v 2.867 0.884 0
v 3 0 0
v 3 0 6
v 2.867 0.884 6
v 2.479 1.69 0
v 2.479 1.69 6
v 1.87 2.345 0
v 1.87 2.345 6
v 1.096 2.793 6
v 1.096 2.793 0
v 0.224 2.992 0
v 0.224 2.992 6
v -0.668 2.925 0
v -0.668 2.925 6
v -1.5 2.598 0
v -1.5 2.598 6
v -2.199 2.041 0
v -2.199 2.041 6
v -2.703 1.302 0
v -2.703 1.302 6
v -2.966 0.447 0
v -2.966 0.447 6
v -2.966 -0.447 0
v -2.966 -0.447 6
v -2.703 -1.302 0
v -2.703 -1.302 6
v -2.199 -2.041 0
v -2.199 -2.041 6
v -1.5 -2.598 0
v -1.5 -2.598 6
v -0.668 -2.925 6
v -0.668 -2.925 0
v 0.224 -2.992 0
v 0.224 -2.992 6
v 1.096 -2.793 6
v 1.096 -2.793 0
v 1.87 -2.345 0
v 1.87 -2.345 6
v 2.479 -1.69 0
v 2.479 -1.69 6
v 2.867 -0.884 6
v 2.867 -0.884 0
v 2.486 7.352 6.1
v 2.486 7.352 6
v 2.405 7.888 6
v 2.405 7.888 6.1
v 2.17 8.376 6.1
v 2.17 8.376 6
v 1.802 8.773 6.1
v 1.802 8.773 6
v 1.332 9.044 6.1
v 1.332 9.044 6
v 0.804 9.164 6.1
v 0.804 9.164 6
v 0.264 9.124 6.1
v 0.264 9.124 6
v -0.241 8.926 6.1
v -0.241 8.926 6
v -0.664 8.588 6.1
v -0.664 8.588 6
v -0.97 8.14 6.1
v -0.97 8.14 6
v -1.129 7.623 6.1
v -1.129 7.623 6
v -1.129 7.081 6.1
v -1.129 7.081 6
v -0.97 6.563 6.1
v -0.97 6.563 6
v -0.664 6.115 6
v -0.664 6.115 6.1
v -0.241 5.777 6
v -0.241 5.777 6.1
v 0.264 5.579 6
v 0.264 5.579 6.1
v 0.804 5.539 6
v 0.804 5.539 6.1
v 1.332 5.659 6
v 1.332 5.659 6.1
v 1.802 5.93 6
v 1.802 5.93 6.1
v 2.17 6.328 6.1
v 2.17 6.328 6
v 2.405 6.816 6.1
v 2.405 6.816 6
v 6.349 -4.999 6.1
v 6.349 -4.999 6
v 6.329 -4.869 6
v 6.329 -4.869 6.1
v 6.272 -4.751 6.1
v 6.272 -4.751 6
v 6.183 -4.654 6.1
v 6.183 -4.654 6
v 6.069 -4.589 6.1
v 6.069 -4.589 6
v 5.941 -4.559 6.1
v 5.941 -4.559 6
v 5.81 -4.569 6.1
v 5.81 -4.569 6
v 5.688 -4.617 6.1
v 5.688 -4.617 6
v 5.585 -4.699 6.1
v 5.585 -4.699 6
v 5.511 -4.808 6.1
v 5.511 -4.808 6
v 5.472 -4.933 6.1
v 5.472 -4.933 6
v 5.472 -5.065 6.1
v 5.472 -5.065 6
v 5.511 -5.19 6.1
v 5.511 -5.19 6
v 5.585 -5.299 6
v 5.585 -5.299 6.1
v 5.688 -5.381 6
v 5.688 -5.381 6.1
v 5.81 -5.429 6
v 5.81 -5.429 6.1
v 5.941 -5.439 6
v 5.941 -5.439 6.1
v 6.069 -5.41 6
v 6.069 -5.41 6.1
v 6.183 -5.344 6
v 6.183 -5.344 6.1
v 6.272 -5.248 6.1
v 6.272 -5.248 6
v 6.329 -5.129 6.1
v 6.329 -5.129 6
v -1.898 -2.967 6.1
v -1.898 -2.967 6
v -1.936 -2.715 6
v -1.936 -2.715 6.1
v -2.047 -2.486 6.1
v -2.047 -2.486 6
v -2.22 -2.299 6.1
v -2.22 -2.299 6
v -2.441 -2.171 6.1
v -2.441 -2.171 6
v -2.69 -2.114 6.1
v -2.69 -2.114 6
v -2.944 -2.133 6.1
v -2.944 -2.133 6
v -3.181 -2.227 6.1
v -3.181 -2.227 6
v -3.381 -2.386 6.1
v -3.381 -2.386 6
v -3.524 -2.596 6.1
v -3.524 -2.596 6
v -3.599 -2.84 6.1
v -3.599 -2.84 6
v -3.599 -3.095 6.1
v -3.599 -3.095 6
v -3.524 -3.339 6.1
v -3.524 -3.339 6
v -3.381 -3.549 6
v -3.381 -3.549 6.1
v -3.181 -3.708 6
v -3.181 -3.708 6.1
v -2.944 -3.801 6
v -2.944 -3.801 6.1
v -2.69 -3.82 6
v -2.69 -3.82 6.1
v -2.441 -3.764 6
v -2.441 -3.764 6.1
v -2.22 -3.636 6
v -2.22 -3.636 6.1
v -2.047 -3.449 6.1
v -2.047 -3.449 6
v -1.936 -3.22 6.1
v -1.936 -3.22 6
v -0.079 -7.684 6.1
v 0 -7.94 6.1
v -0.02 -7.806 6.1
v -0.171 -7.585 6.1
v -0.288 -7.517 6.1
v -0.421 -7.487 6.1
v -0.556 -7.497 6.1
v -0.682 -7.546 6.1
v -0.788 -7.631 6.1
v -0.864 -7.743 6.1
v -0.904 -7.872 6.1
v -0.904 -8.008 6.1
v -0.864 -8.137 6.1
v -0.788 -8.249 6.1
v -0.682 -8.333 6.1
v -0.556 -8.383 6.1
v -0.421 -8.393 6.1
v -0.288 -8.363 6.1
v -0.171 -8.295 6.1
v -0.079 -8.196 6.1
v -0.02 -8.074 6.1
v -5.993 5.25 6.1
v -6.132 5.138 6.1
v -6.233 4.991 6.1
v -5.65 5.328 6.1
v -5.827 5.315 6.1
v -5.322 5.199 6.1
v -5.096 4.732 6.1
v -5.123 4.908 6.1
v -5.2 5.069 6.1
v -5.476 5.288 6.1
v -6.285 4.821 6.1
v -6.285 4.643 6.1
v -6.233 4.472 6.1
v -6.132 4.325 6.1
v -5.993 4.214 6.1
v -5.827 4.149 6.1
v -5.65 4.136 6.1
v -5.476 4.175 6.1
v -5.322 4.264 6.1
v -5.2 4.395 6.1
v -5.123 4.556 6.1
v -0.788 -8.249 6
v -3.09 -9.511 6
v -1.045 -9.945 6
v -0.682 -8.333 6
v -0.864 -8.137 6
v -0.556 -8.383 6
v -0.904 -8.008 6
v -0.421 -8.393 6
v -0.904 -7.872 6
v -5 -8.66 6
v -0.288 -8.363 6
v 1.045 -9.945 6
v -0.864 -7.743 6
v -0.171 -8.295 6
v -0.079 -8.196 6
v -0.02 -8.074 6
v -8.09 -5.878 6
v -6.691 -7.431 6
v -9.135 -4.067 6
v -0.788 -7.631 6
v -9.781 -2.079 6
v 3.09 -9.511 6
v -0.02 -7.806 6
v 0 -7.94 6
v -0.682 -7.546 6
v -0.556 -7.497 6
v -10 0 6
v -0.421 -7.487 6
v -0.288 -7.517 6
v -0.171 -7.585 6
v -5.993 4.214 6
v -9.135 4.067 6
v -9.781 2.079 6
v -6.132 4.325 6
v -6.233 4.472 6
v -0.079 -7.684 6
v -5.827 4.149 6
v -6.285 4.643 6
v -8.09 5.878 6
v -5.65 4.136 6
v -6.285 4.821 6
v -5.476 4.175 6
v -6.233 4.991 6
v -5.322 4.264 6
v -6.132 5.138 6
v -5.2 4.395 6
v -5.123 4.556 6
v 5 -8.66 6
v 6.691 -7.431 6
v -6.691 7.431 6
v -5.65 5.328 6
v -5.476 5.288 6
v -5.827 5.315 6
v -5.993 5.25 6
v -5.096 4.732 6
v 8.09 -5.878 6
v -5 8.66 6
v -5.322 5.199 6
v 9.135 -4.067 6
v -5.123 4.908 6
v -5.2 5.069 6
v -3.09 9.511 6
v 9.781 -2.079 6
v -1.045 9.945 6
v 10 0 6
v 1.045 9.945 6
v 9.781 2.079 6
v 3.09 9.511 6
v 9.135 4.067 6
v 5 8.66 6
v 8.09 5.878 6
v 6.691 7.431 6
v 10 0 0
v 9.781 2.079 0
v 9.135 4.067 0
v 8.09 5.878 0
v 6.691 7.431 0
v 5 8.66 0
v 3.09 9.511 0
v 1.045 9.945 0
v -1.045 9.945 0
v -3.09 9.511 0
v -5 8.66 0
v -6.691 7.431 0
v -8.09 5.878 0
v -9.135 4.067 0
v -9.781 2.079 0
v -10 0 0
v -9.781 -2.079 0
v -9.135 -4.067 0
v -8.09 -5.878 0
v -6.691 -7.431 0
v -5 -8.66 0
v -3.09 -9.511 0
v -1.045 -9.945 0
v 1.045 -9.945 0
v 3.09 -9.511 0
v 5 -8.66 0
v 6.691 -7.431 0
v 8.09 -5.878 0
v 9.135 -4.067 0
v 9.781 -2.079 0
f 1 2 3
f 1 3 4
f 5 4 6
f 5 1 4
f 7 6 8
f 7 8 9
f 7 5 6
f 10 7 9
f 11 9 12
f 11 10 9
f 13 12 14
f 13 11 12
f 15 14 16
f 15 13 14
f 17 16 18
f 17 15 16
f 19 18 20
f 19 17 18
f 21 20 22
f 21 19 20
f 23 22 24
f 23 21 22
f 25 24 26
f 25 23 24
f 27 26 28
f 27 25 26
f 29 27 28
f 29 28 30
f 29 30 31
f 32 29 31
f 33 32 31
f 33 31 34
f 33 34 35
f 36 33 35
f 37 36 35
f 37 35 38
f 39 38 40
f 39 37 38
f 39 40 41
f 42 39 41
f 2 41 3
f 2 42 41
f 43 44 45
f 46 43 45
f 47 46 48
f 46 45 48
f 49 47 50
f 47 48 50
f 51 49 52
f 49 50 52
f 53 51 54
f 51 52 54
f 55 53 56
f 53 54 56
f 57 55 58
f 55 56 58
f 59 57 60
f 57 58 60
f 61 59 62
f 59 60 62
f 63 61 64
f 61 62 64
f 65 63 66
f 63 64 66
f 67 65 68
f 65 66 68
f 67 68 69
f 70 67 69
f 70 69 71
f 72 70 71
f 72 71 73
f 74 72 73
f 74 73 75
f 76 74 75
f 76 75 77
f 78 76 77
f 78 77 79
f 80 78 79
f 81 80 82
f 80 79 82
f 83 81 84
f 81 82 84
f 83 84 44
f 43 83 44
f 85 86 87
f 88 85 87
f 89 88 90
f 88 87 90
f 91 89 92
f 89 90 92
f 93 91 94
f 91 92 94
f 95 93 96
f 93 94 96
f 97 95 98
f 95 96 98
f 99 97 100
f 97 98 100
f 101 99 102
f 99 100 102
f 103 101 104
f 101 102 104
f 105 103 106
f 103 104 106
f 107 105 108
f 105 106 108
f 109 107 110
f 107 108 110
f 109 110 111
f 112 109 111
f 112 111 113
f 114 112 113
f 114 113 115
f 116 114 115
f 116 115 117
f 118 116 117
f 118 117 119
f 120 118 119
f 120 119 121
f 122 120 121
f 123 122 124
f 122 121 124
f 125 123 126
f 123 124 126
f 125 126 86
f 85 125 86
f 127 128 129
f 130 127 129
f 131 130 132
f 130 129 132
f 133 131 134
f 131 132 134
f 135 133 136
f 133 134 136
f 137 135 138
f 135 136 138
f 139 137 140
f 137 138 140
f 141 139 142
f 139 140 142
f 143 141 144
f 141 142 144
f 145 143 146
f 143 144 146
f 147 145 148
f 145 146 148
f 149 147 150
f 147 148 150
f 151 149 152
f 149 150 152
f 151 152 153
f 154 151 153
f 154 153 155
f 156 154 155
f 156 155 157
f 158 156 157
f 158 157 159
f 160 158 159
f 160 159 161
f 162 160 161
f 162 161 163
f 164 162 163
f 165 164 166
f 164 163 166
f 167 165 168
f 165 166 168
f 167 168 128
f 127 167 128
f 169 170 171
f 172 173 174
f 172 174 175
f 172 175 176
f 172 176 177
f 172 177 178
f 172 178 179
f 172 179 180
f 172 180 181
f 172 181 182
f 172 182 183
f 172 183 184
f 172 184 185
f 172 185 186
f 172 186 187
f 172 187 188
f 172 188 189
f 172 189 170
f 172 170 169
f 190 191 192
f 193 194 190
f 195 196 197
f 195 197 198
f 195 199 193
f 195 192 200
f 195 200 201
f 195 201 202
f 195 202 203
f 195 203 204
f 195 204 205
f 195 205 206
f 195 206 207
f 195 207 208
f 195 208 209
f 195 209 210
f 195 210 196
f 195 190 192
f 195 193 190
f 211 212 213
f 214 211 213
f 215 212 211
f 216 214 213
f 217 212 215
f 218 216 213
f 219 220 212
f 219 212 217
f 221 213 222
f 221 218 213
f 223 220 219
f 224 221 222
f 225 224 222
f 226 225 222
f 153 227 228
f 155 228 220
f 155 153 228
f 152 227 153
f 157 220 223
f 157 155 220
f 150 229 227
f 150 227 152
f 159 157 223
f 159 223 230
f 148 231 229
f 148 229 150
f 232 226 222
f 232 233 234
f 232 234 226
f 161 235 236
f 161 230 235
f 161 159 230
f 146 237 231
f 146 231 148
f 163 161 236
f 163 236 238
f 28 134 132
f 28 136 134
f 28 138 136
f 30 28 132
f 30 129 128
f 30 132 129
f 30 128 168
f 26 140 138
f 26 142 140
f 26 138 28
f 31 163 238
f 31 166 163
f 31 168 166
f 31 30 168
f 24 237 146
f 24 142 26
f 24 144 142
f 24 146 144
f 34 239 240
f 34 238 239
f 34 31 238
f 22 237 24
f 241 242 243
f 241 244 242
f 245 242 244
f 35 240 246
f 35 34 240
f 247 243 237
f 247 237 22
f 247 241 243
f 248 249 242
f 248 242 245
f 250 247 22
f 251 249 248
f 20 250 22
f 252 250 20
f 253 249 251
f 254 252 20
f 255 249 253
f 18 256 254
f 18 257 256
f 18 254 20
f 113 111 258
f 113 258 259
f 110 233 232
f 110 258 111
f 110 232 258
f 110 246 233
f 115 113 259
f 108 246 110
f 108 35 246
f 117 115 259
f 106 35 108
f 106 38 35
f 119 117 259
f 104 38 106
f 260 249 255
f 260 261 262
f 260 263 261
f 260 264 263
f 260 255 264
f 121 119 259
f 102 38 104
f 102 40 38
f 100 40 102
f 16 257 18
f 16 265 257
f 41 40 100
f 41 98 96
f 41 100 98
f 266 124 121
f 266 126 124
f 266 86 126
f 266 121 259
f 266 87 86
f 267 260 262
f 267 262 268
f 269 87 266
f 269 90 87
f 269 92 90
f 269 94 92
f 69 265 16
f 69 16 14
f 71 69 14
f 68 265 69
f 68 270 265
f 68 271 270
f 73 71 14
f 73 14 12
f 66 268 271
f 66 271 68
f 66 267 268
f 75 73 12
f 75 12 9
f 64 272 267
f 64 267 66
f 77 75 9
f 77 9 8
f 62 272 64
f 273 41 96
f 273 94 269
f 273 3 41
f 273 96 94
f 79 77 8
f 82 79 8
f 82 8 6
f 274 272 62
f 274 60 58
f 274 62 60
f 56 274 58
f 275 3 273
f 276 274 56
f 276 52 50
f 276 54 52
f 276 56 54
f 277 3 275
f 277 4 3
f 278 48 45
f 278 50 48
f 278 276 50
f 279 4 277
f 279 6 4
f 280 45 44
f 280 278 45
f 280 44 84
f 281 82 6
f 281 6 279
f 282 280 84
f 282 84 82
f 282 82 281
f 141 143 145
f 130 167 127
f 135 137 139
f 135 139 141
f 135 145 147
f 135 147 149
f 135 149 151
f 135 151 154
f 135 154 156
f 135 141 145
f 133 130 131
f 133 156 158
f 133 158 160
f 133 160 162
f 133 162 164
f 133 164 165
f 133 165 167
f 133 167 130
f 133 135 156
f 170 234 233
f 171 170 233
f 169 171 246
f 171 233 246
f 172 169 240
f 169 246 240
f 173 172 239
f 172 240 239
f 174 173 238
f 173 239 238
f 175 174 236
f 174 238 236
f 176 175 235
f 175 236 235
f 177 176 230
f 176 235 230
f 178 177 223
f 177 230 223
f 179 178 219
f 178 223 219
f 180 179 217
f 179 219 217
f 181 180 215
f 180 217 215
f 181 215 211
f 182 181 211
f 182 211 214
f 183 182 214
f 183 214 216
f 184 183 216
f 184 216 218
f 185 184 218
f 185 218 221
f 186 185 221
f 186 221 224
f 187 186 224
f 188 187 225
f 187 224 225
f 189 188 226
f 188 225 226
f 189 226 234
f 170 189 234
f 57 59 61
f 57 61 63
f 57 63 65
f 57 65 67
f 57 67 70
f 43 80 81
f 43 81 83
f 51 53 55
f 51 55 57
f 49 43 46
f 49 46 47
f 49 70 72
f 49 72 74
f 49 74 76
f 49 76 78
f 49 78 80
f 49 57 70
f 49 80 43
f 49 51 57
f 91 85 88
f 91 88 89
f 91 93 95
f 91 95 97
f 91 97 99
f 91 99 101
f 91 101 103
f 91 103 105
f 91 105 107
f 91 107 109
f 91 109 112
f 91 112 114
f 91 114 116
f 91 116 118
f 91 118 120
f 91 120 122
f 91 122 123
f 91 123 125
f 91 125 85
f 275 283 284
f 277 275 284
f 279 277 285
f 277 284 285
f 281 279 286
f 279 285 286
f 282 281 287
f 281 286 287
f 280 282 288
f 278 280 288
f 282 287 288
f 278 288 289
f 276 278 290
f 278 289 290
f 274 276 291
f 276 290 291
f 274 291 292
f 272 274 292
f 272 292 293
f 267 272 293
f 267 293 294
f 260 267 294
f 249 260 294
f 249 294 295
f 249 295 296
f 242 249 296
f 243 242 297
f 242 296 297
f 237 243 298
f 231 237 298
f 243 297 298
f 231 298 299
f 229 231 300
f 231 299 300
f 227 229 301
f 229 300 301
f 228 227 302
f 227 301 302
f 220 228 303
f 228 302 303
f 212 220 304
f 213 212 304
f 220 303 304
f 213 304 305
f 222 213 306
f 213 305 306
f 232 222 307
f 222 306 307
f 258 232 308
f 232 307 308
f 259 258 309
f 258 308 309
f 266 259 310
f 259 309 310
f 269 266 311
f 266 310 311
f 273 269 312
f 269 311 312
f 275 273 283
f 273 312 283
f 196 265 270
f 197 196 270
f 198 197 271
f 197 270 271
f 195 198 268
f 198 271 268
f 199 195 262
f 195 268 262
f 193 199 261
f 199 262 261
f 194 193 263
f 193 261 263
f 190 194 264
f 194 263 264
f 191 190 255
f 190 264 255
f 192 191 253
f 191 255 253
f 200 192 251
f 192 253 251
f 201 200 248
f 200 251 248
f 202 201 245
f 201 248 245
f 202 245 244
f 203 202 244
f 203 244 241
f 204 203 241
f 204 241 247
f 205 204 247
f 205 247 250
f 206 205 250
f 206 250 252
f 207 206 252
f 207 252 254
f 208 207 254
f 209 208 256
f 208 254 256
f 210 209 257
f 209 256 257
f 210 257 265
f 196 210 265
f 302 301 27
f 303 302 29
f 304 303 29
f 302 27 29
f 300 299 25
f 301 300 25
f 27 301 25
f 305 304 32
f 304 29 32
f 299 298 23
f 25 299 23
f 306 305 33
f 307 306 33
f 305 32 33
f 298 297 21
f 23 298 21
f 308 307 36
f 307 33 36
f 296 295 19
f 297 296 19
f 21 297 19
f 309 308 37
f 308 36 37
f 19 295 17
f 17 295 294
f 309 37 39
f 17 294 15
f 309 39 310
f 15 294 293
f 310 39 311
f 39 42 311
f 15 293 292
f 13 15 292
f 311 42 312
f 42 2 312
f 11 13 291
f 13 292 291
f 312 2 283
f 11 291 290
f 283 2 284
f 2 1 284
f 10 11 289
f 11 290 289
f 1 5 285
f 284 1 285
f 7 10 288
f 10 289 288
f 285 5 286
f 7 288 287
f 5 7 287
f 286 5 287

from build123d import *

# Parameters (mm, degrees)
ESBO_O1_R                = 10
ESBO_O1_R_2              = 3
RESSALTO_EXTRUS_O1_DEPTH = 6
ESBO_O2_R                = 0.597777341
ESBO_O2_R_2              = 1.817872247
ESBO_O2_R_3              = 0.440898782
ESBO_O2_R_4              = 0.855469293
ESBO_O2_R_5              = 0.454468062
RESSALTO_EXTRUS_O2_DEPTH = 0.1


with BuildPart() as part:
    # Esboço1 → Ressalto-extrusão1 (new body)
    with BuildSketch(Plane.XY):
        Circle(ESBO_O1_R)
        Circle(ESBO_O1_R_2, mode=Mode.SUBTRACT)
    extrude(amount=RESSALTO_EXTRUS_O1_DEPTH)

    # Esboço2 → Ressalto-extrusão2 (add)
    with BuildSketch(Plane.XY.offset(6)):
        with Locations((-5.694217479, 4.731814525)):
            Circle(ESBO_O2_R)
        with Locations((0.668335385, 7.351689234)):
            Circle(ESBO_O2_R_2)
        with Locations((5.908084803, -4.999148679)):
            Circle(ESBO_O2_R_3)
        with Locations((-2.753541786, -2.967409109)):
            Circle(ESBO_O2_R_4)
        with Locations((-0.454468062, -7.939824373)):
            Circle(ESBO_O2_R_5)
    extrude(amount=RESSALTO_EXTRUS_O2_DEPTH)


solid = part.part
